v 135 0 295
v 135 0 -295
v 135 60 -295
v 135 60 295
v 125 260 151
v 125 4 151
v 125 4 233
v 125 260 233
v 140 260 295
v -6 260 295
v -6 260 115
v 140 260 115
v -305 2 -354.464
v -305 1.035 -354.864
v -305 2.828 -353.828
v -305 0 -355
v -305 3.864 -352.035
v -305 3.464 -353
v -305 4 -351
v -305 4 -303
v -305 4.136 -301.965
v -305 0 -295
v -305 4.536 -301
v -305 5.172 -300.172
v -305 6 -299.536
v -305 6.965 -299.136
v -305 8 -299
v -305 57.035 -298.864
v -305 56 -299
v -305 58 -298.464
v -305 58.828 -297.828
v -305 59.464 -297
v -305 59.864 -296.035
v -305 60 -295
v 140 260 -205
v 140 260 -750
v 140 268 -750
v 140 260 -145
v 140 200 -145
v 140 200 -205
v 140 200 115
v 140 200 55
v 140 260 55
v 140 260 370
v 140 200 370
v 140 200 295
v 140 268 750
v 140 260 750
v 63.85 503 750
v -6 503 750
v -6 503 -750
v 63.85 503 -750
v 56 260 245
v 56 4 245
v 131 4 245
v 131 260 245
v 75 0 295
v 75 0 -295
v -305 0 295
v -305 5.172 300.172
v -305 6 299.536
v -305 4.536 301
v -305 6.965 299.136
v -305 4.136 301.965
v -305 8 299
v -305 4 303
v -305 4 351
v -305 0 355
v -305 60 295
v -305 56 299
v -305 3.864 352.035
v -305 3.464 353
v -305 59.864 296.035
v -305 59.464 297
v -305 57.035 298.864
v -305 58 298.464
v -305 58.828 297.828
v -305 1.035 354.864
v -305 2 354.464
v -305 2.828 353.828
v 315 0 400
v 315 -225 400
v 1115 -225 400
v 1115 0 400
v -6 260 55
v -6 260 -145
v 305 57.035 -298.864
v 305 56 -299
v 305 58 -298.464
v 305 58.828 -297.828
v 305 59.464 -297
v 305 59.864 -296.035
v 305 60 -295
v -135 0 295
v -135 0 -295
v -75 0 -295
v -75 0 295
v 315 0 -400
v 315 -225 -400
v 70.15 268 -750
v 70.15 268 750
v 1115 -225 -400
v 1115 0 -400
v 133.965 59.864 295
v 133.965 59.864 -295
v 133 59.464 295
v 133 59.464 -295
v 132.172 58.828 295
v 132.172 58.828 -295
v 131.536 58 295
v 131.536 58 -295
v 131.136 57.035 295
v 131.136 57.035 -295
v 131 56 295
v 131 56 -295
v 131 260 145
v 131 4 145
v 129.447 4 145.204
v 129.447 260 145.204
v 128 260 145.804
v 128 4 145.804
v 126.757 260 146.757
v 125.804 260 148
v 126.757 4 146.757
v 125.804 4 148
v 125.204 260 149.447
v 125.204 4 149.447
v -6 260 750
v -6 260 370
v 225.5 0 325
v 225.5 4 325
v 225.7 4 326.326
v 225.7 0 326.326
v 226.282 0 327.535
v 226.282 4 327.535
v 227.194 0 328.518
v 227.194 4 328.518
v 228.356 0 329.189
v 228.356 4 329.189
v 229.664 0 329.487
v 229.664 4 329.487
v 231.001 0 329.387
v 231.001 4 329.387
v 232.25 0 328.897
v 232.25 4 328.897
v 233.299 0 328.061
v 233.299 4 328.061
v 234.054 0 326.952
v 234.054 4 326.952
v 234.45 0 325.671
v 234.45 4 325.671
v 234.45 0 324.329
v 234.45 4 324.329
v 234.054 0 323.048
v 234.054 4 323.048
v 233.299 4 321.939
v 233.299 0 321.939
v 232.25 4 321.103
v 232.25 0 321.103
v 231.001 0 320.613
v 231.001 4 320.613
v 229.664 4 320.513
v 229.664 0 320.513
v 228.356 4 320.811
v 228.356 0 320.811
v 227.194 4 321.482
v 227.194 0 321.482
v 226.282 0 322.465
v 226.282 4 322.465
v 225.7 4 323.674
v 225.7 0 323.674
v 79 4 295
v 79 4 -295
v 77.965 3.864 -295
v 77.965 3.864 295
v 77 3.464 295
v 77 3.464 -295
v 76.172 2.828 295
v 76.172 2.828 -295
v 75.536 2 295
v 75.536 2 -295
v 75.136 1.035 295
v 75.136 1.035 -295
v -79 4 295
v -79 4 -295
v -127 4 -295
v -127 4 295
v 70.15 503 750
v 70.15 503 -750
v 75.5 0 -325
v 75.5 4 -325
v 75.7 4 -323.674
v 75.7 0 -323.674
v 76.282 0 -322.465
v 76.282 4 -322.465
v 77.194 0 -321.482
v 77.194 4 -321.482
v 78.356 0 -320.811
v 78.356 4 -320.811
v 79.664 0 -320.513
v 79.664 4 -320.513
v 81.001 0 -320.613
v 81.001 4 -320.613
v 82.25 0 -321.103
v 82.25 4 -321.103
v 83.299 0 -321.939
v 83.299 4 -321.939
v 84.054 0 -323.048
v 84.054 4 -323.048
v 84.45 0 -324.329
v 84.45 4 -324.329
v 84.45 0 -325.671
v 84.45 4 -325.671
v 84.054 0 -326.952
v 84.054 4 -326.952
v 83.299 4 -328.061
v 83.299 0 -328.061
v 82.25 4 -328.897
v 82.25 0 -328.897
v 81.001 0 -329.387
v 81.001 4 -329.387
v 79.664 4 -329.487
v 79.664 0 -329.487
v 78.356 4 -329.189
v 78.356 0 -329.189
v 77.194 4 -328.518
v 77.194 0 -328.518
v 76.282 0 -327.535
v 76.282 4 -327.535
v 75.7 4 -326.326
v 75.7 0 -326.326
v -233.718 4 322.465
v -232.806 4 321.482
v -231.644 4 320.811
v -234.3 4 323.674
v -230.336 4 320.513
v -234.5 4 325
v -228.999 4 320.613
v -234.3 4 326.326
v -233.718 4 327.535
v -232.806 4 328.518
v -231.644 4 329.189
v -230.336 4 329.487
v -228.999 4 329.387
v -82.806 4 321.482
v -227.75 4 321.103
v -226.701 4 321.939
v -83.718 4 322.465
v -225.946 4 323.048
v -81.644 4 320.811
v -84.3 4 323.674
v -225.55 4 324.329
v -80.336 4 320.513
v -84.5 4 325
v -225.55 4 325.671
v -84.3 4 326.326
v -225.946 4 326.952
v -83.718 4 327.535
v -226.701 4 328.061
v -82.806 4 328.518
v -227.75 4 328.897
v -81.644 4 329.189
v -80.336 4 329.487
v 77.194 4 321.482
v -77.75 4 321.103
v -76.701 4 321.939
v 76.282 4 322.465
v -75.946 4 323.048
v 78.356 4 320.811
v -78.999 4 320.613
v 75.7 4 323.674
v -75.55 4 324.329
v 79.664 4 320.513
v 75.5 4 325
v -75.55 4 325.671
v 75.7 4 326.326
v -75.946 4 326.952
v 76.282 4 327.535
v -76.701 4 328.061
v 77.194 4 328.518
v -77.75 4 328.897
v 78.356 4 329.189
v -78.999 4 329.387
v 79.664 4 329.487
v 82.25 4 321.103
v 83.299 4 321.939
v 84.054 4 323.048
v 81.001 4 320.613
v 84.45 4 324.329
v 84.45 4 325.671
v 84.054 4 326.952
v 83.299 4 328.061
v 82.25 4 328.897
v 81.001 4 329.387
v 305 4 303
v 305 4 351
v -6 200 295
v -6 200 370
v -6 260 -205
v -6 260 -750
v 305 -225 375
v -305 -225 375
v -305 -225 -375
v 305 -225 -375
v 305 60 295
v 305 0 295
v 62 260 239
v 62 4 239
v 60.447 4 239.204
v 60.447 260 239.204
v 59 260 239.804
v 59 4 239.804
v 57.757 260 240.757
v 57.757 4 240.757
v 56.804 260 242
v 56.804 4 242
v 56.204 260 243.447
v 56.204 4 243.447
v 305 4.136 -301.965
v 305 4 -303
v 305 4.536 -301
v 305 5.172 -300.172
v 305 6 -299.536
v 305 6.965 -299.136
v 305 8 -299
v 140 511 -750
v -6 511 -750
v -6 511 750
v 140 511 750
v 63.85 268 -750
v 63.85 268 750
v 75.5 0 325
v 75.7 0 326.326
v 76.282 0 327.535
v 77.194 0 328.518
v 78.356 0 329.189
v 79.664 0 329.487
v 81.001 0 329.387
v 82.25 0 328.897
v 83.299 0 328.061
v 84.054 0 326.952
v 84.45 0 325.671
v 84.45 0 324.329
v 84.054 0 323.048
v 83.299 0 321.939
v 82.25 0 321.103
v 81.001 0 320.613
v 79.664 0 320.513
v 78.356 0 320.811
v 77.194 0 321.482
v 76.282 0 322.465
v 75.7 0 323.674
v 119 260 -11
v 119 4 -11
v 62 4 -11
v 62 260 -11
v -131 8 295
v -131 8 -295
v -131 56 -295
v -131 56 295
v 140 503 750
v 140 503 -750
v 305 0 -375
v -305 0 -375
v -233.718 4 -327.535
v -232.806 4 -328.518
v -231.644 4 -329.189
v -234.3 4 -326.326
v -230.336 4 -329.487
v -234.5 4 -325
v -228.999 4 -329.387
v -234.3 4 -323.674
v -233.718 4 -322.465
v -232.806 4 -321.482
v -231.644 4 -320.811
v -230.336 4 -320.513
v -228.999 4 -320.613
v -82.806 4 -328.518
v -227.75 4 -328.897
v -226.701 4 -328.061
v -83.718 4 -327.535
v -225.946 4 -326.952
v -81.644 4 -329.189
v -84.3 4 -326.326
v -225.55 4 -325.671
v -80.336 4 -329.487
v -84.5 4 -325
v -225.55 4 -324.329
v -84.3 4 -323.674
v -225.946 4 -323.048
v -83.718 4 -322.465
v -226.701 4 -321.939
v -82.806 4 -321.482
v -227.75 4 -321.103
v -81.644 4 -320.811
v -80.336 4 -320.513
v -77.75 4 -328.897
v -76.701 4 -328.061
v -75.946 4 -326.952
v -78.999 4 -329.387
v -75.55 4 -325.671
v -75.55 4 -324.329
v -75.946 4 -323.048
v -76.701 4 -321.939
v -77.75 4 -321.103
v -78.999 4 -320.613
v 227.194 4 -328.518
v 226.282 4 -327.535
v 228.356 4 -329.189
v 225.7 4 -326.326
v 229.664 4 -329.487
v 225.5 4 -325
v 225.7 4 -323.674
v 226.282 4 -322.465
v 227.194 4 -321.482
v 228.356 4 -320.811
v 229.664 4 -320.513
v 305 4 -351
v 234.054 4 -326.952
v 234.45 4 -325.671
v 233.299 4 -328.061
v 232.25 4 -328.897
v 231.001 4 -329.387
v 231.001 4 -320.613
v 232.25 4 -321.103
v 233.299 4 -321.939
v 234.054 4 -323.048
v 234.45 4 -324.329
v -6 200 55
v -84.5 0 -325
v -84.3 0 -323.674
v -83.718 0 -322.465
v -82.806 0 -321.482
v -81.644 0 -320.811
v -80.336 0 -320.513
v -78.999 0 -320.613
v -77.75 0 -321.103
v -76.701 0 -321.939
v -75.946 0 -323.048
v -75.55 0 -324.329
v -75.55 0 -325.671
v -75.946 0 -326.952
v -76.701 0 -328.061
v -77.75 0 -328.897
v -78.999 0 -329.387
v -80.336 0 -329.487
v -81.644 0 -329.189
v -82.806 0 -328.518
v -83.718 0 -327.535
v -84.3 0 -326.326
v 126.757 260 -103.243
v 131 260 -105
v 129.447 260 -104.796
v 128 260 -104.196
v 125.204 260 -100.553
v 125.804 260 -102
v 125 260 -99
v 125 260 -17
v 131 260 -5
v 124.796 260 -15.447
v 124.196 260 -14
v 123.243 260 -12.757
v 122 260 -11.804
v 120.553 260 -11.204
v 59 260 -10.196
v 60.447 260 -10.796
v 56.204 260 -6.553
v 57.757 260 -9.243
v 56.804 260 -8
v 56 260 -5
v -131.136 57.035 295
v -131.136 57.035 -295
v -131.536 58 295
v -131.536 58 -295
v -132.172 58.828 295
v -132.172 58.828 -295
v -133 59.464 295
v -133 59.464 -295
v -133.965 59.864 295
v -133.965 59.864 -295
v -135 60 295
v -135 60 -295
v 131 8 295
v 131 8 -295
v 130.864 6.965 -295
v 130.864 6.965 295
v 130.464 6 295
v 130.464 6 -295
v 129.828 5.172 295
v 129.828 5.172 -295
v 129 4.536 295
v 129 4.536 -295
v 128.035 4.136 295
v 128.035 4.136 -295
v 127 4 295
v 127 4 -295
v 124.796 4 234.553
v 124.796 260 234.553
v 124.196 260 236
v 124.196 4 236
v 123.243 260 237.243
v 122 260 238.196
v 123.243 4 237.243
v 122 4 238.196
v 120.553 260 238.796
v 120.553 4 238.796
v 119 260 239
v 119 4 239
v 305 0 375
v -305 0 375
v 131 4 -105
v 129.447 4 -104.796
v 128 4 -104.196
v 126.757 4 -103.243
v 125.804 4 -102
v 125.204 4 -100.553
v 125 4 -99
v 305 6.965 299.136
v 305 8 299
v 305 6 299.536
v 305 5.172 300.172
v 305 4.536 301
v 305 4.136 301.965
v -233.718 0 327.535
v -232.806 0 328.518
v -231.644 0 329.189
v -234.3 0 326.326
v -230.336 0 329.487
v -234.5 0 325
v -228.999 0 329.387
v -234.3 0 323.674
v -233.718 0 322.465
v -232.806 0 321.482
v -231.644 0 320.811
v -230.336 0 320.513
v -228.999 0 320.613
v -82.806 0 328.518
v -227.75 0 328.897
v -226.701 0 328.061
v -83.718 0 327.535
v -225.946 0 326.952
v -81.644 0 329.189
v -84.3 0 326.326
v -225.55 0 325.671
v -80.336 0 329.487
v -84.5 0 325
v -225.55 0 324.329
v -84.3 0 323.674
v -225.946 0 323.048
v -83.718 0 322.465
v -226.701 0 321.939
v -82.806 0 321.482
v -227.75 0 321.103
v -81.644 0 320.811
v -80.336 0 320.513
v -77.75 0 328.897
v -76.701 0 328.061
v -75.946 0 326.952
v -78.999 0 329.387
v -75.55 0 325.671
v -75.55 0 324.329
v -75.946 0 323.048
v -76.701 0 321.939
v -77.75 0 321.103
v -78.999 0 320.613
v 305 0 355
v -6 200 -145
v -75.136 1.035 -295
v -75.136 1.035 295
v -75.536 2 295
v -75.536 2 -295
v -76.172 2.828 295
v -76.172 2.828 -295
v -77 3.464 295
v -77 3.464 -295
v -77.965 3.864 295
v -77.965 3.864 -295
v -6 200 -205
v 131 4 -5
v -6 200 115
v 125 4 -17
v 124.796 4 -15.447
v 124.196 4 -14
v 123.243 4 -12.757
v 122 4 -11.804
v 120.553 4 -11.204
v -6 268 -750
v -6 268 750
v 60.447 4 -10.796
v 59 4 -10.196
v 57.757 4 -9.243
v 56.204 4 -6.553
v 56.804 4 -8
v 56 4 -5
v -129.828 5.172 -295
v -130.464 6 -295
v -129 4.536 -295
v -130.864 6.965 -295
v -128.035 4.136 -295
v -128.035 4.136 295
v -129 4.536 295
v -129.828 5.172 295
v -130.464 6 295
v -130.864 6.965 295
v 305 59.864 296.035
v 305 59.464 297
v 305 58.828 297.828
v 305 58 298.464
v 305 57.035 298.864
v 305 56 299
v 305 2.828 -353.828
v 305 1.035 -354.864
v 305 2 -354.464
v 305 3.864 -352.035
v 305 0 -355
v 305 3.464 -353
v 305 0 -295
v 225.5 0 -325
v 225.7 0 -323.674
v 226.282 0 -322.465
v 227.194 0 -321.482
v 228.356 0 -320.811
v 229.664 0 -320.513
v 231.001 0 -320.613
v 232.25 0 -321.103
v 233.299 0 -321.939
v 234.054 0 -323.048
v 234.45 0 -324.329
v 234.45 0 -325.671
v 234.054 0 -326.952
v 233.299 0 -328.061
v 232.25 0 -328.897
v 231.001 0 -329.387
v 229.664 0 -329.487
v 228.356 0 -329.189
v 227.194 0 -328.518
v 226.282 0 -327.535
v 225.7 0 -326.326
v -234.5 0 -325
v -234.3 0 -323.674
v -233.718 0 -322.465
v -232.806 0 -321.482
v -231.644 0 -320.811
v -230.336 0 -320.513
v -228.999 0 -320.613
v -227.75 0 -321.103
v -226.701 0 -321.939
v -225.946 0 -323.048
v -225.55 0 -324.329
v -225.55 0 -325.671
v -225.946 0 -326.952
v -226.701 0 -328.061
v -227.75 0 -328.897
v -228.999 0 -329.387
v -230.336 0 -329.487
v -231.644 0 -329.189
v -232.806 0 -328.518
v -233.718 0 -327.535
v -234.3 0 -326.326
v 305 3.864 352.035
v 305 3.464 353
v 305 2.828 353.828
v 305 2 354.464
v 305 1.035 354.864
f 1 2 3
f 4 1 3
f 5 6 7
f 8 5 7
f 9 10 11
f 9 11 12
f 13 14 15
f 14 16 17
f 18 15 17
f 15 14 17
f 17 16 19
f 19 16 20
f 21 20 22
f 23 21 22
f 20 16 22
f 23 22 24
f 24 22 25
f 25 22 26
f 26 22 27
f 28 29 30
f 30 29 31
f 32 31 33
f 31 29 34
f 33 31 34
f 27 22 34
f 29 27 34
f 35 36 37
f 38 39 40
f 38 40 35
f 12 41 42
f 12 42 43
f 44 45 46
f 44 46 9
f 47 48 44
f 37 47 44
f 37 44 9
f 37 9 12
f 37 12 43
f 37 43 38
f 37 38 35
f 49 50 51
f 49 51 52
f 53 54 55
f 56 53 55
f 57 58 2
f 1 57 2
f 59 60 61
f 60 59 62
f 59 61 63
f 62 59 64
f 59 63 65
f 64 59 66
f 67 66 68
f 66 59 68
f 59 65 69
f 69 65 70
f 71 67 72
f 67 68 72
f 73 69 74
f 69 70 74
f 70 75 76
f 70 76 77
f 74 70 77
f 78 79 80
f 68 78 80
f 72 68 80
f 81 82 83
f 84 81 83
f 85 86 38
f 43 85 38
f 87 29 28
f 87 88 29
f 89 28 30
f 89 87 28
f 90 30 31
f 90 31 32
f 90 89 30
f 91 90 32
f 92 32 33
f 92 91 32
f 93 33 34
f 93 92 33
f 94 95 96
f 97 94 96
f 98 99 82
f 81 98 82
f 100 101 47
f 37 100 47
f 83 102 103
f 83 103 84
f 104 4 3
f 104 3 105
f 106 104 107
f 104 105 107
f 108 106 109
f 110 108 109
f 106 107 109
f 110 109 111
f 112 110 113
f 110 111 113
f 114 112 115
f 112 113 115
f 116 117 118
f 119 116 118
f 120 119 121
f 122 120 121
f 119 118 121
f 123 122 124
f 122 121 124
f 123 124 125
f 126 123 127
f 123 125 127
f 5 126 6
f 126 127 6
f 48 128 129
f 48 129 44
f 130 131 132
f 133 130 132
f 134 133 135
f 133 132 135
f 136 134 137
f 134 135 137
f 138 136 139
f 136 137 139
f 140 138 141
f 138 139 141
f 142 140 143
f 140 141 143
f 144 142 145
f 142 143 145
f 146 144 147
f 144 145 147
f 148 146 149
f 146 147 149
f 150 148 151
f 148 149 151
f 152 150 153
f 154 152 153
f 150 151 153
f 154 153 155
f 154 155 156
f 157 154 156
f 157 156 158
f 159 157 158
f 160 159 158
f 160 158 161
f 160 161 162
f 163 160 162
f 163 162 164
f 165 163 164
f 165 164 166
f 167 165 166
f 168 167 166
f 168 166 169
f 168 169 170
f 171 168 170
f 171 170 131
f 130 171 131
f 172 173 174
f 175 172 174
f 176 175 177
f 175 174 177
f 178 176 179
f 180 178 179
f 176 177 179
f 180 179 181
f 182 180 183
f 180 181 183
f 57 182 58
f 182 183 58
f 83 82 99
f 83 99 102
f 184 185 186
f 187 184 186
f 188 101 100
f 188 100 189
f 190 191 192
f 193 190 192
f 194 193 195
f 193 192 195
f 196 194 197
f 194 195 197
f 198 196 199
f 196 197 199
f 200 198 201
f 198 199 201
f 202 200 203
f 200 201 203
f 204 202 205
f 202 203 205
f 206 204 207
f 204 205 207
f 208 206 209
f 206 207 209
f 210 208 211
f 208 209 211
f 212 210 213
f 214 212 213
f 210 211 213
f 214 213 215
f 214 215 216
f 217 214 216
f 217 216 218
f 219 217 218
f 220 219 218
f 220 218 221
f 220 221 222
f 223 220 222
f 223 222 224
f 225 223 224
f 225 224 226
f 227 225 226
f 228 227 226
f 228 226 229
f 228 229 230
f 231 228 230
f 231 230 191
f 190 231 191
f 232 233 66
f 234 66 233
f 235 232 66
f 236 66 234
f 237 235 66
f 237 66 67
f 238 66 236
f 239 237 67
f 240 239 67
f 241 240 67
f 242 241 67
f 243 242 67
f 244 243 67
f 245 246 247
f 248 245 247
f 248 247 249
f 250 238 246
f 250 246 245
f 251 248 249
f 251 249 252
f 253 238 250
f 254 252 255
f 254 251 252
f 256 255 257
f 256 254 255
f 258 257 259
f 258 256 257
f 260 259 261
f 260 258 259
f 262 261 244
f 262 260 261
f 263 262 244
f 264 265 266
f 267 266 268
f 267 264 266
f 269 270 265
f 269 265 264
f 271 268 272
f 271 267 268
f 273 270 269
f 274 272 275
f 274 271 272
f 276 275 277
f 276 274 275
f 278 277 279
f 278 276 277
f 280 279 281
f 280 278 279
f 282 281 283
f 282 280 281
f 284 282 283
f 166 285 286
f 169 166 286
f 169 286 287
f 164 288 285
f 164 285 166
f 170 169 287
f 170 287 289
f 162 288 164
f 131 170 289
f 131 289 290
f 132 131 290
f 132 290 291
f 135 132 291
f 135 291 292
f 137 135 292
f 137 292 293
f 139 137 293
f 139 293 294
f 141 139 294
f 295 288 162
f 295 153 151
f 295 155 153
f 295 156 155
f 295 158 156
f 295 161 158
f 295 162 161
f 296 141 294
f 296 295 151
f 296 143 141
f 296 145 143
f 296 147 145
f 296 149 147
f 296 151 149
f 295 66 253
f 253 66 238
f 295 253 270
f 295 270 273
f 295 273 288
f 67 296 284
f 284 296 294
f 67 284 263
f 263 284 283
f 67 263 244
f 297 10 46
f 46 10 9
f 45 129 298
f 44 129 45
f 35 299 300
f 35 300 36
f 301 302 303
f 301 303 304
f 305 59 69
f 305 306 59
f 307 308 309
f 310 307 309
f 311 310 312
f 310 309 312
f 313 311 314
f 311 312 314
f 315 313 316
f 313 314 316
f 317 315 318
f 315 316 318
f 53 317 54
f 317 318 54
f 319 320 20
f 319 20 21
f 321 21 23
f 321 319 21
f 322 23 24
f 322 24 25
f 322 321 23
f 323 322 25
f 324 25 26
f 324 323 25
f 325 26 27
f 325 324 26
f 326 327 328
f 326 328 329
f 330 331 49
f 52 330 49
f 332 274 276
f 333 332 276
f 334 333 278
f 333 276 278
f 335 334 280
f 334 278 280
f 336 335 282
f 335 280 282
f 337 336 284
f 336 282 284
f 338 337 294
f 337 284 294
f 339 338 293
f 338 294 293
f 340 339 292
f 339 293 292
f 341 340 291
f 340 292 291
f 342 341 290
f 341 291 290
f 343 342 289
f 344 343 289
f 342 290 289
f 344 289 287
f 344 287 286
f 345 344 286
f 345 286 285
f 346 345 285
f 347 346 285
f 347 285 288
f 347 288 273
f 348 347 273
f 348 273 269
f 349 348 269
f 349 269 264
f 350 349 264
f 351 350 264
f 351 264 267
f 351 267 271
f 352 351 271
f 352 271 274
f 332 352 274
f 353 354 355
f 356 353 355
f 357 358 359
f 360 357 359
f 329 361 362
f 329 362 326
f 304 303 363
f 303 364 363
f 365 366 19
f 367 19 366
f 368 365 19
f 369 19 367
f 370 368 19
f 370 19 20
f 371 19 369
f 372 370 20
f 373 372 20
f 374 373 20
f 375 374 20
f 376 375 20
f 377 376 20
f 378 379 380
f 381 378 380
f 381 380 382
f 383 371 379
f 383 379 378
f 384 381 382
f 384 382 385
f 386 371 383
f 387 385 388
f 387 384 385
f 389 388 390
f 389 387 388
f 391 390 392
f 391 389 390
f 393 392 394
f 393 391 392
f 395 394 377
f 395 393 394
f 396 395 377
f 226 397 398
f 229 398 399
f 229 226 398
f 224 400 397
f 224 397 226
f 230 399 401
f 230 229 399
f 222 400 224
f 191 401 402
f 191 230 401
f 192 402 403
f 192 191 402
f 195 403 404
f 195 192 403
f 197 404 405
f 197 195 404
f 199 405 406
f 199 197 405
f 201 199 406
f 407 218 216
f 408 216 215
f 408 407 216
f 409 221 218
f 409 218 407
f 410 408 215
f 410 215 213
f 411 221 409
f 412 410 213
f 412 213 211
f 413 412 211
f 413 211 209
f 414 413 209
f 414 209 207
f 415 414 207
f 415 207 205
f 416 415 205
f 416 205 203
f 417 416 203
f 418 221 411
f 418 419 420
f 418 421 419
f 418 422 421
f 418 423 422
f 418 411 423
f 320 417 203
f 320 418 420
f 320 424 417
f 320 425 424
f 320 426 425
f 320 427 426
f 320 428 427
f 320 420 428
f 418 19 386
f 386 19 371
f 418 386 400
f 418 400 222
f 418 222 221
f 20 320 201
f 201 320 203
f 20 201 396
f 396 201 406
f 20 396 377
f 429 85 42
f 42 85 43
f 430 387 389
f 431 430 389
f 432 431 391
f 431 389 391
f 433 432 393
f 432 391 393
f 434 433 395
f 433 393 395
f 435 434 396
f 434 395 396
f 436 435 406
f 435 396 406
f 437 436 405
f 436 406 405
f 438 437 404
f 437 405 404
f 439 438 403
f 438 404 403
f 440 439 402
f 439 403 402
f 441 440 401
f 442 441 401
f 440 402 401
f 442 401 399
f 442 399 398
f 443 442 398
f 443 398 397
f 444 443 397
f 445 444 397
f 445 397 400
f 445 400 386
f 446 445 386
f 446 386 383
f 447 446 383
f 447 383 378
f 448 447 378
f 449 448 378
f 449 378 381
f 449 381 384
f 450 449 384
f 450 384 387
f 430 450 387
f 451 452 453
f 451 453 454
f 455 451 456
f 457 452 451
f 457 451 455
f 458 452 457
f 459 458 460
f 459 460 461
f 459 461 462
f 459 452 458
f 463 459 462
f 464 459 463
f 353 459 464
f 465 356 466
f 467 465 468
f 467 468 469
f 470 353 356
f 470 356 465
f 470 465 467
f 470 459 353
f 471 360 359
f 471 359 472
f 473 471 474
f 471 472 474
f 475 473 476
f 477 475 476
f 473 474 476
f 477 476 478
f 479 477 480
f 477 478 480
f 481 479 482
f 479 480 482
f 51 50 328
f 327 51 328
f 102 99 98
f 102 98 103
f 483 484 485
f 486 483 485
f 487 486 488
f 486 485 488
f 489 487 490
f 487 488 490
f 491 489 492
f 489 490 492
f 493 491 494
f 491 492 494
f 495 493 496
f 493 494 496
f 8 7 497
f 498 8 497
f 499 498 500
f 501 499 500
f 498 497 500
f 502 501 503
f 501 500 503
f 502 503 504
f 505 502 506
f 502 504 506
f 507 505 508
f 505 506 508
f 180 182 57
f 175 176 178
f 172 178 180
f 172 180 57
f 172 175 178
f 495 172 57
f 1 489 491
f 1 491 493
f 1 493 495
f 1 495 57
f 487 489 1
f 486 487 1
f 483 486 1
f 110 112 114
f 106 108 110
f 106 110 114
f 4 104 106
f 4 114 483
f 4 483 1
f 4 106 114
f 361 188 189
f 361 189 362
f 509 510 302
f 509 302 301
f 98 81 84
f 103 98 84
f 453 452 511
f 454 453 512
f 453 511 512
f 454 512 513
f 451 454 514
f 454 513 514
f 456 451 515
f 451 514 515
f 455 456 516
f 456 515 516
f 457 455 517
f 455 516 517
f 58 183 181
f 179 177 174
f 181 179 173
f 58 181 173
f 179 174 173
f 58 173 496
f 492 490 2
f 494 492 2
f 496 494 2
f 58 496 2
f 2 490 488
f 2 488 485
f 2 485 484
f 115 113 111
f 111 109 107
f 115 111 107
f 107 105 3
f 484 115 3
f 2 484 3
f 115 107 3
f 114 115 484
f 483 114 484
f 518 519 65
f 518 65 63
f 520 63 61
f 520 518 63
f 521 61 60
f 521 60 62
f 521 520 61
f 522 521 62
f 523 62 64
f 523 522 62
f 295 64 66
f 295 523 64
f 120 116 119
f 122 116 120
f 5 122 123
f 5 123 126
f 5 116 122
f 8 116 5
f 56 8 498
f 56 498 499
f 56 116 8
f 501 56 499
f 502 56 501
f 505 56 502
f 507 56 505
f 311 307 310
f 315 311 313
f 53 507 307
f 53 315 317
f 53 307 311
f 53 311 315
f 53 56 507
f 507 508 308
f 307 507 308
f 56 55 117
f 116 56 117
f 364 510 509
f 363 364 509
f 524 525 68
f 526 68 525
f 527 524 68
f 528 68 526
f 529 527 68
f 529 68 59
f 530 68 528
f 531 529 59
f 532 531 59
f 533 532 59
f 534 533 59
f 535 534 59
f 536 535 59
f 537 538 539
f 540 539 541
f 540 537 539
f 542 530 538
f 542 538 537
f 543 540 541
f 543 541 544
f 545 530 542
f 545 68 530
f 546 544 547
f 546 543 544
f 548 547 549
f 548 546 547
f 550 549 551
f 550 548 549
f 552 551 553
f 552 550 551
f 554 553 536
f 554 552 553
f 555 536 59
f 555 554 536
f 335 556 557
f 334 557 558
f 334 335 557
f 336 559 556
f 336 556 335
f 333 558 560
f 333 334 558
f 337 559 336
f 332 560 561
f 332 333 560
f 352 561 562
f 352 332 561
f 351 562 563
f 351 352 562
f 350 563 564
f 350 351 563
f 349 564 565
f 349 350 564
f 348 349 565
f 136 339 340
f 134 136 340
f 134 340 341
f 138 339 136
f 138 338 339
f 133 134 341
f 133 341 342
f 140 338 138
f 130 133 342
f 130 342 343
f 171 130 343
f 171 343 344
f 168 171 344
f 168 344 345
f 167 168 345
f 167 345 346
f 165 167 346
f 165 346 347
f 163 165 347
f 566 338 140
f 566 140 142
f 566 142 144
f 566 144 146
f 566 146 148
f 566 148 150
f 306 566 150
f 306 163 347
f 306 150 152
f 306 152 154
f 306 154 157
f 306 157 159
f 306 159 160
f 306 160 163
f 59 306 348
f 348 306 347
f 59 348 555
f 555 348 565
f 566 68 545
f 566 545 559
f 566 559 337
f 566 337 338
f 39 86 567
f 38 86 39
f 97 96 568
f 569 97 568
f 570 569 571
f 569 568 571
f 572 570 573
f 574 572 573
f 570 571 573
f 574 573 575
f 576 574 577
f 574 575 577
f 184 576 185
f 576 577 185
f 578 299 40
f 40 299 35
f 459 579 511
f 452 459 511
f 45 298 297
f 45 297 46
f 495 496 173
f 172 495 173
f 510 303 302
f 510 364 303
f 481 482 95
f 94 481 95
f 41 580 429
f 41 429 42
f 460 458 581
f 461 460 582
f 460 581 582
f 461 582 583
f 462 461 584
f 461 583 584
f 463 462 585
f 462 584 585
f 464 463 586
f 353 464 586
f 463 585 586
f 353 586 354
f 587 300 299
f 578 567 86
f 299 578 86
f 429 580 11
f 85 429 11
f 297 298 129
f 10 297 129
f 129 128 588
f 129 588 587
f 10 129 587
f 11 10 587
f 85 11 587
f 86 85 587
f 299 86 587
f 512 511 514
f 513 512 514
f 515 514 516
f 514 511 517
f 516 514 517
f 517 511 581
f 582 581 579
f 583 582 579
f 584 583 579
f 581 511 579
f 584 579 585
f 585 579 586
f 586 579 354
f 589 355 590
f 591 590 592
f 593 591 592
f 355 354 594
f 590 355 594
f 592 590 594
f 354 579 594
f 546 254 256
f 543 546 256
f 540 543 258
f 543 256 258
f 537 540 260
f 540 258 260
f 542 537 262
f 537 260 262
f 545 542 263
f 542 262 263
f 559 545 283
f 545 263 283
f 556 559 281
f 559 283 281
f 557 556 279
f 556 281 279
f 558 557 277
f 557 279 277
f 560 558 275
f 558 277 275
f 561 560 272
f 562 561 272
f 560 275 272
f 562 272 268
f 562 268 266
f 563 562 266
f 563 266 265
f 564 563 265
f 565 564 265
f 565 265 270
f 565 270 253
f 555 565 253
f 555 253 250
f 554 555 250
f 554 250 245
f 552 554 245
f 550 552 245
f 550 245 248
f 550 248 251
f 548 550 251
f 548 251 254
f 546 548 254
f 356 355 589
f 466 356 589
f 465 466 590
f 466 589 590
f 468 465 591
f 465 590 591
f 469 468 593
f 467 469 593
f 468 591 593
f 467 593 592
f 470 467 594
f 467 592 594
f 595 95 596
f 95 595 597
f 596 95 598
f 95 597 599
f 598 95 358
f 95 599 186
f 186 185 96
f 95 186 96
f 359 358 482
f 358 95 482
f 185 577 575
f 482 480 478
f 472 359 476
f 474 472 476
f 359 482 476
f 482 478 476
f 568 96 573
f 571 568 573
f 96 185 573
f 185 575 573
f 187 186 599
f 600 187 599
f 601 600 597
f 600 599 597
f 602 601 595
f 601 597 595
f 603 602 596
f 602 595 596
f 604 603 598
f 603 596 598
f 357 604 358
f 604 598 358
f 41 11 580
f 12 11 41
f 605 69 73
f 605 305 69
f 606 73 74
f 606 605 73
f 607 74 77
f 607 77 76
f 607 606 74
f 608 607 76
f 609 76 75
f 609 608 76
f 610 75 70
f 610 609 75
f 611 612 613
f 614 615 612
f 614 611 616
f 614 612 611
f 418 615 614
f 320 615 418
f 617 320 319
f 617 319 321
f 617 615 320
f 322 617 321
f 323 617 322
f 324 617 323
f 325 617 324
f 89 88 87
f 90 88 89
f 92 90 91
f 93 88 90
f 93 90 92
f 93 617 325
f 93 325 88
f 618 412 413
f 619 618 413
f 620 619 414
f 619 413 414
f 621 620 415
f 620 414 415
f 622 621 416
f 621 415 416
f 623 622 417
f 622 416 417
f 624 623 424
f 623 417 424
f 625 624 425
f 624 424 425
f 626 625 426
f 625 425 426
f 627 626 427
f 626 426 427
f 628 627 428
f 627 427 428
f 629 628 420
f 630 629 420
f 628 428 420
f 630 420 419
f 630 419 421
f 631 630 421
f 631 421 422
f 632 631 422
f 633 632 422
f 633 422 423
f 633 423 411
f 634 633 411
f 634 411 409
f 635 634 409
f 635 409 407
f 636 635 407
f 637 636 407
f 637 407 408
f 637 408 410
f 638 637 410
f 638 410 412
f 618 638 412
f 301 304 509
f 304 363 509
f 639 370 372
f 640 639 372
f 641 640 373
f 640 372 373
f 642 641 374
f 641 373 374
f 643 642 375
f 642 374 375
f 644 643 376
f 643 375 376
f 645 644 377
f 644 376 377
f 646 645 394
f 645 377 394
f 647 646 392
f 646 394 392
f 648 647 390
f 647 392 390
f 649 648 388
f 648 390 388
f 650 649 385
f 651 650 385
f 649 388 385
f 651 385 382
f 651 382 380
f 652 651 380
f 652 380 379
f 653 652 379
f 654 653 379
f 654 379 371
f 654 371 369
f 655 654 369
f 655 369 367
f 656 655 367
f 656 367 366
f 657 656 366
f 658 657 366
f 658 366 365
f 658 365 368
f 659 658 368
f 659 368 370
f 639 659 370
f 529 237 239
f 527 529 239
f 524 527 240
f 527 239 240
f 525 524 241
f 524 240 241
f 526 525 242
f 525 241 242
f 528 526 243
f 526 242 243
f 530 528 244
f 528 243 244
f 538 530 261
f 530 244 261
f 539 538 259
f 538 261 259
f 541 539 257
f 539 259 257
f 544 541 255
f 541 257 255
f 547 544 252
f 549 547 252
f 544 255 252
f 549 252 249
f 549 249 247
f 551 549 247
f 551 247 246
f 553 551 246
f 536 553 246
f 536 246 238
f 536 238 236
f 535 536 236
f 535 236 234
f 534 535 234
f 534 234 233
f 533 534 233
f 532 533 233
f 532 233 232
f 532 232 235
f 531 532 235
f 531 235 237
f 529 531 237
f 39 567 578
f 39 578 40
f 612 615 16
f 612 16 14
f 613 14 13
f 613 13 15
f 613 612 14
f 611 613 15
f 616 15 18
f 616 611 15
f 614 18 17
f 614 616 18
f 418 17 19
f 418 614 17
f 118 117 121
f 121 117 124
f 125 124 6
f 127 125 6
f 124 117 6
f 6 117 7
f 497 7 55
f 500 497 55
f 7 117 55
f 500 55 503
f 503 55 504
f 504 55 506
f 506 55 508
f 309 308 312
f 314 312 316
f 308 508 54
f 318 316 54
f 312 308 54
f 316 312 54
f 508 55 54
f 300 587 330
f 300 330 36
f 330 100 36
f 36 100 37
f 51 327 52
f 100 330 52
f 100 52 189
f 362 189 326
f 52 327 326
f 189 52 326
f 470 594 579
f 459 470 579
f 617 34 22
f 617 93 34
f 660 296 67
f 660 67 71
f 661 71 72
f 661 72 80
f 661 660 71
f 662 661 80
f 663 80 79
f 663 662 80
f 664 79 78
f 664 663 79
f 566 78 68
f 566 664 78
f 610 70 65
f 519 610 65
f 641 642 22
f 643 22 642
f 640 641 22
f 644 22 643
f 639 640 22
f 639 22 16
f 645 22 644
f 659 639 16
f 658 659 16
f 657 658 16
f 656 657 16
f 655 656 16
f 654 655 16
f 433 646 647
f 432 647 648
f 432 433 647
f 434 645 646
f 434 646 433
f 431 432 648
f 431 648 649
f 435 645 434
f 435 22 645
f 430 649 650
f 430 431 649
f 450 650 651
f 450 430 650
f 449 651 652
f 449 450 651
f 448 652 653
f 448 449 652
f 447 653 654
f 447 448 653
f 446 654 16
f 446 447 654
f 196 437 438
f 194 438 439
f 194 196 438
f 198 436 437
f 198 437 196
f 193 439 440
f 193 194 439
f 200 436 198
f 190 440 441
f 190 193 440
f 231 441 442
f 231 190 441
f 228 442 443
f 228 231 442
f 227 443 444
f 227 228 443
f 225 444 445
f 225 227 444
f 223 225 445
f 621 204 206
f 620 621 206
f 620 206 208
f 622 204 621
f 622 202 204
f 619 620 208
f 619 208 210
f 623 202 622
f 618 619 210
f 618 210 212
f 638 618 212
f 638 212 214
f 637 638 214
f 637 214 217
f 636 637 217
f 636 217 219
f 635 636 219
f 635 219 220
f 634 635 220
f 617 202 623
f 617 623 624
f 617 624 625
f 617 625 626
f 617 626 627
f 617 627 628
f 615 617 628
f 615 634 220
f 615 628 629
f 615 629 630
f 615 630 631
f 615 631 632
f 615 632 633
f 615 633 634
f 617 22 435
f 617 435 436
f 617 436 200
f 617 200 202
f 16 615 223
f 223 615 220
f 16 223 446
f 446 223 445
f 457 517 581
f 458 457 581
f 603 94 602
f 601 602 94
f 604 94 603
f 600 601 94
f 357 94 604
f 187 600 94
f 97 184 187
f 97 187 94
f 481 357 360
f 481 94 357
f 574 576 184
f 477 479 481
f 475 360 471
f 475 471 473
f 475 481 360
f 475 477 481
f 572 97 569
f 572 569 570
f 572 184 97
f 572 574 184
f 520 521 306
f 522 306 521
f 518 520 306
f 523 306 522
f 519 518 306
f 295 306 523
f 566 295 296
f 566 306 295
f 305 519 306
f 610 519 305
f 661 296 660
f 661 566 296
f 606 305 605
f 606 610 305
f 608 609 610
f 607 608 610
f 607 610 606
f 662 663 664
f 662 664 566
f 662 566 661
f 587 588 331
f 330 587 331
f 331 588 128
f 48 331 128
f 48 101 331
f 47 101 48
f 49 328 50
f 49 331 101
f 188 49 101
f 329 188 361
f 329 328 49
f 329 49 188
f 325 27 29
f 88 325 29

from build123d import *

# Parameters (mm, degrees)
F1_DEPTH  = 305
F3_DEPTH  = 590
F5_D      = 9
F5_2_D    = 9
F6_W      = 610
F6_H      = 750
F7_DEPTH  = 200
F8_DEPTH  = 25
F9_W      = 800
F9_H      = 800
F10_DEPTH = 225
F11_W     = 146
F11_H     = 251
F12_DEPTH = 750
F13_W     = 139.7
F13_H     = 235
F14_DEPTH = 1500.001
F15_W     = 146
F15_H     = 75
F15_H_2   = 60
F16_DEPTH = 60
F18_DEPTH = 256


with BuildPart() as f1:
    # F0 (on Right) → F1 (new body, symmetric)
    with BuildSketch(Plane.YZ):
        with BuildLine():
            Line((60, -295), (0, -295))
            Line((0, -295), (0, -355))
            ThreePointArc((0, -355), (2.8284271247, -353.8284271247), (4, -351))
            Line((4, -351), (4, -303))
            ThreePointArc((4, -303), (5.1715728753, -300.1715728753), (8, -299))
            Line((8, -299), (56, -299))
            ThreePointArc((56, -299), (58.8284271247, -297.8284271247), (60, -295))
        make_face()
    extrude(amount=F1_DEPTH, both=True)

    # F5 (through all)
    with Locations(Plane.XZ):
        with Locations((-230, 325), (-80, 325), (80, 325), (230, 325), (-80, -325), (80, -325), (-230, -325), (230, -325)):
            Hole(F5_D / 2)


with BuildPart() as f1b:
    # F0 (on Right) → F1, piece 2 (new body, symmetric)
    with BuildSketch(Plane.YZ):
        with BuildLine():
            ThreePointArc((60, 295), (58.8284271247, 297.8284271247), (56, 299))
            Line((56, 299), (8, 299))
            ThreePointArc((8, 299), (5.1715728753, 300.1715728753), (4, 303))
            Line((4, 303), (4, 351))
            ThreePointArc((4, 351), (2.8284271247, 353.8284271247), (0, 355))
            Line((0, 355), (0, 295))
            Line((0, 295), (60, 295))
        make_face()
    extrude(amount=F1_DEPTH, both=True)

    # F5#2 (through all)
    with Locations(Plane.XZ):
        with Locations((-230, 325), (-80, 325), (80, 325), (230, 325), (-80, -325), (80, -325), (-230, -325), (230, -325)):
            Hole(F5_2_D / 2)


with BuildPart() as f3:
    # F2 (on face) → F3 (new body, through all)
    with BuildSketch(Plane.XY.offset(-295)):
        with BuildLine():
            ThreePointArc((135, 60), (132.1715728753, 58.8284271247), (131, 56))
            Line((131, 56), (131, 8))
            ThreePointArc((131, 8), (129.8284271247, 5.1715728753), (127, 4))
            Line((127, 4), (79, 4))
            ThreePointArc((79, 4), (76.1715728753, 2.8284271247), (75, 0))
            Line((75, 0), (135, 0))
            Line((135, 0), (135, 60))
        make_face()
    extrude(amount=F3_DEPTH)


with BuildPart() as f3b:
    # F2 (on face) → F3, piece 2 (new body, through all)
    with BuildSketch(Plane.XY.offset(-295)):
        with BuildLine():
            Line((-135, 0), (-75, 0))
            ThreePointArc((-75, 0), (-76.1715728753, 2.8284271247), (-79, 4))
            Line((-79, 4), (-127, 4))
            ThreePointArc((-127, 4), (-129.8284271247, 5.1715728753), (-131, 8))
            Line((-131, 8), (-131, 56))
            ThreePointArc((-131, 56), (-132.1715728753, 58.8284271247), (-135, 60))
            Line((-135, 60), (-135, 0))
        make_face()
    extrude(amount=F3_DEPTH)


with BuildPart() as f7:
    # F6 (on face) → F7 (new body)
    with BuildSketch(Plane.XZ):
        Rectangle(F6_W, F6_H)
    extrude(amount=F7_DEPTH)

    # F8 (add): a face of the model
    f8_faces = [f7.faces().sort_by_distance(p)[0] for p in [
        (0, -200, 0),
    ]]
    extrude(f8_faces, amount=F8_DEPTH)


with BuildPart() as f10:
    # F9 (on face) → F10 (new body, through all)
    with BuildSketch(Plane.XZ.offset(225)):
        with Locations((715, 0)):
            Rectangle(F9_W, F9_H)
    extrude(amount=-F10_DEPTH)


with BuildPart() as f12:
    # F11 (on Top) → F12 (new body, symmetric)
    with BuildSketch(Plane.XY):
        with Locations((67, 385.5)):
            Rectangle(F11_W, F11_H)
    extrude(amount=F12_DEPTH, both=True)

    # F13 (on face) → F14 (cut, through all)
    with BuildSketch(Plane.XY.offset(750)):
        with Locations((140, 385.5)):
            Rectangle(F13_W, F13_H)
        with Locations((-6, 385.5)):
            Rectangle(F13_W, F13_H)
    extrude(amount=-F14_DEPTH, mode=Mode.SUBTRACT)

    # F15 (on face) → F16 (join)
    with BuildSketch(Plane.XZ.offset(-260)):
        with Locations((67, 332.5)):
            Rectangle(F15_W, F15_H)
        with Locations((67, 85)):
            Rectangle(F15_W, F15_H_2)
        with Locations((67, -175)):
            Rectangle(F15_W, F15_H_2)
    extrude(amount=F16_DEPTH)


with BuildPart() as f18:
    # F17 (on face) → F18 (new body, through all)
    with BuildSketch(Plane(origin=(0, 4, 0), x_dir=(-1, 0, 0), z_dir=(0, 1, 0))):
        with BuildLine():
            Line((-131, 245), (-131, 145))
            ThreePointArc((-131, 145), (-126.7573593129, 146.7573593129), (-125, 151))
            Line((-125, 151), (-125, 233))
            ThreePointArc((-125, 233), (-123.2426406871, 237.2426406871), (-119, 239))
            Line((-119, 239), (-62, 239))
            ThreePointArc((-62, 239), (-57.7573593129, 240.7573593129), (-56, 245))
            Line((-56, 245), (-131, 245))
        make_face()
    extrude(amount=F18_DEPTH)


with BuildPart() as f18b:
    # F17 (on face) → F18, piece 2 (new body, through all)
    with BuildSketch(Plane(origin=(0, 4, 0), x_dir=(-1, 0, 0), z_dir=(0, 1, 0))):
        with BuildLine():
            Line((-125, -99), (-125, -17))
            ThreePointArc((-125, -17), (-123.2426406871, -12.7573593129), (-119, -11))
            Line((-119, -11), (-62, -11))
            ThreePointArc((-62, -11), (-57.7573593129, -9.2426406871), (-56, -5))
            Line((-56, -5), (-131, -5))
            Line((-131, -5), (-131, -105))
            ThreePointArc((-131, -105), (-126.7573593129, -103.2426406871), (-125, -99))
        make_face()
    extrude(amount=F18_DEPTH)


solid = Compound([f1.part, f1b.part, f3.part, f3b.part, f7.part, f10.part, f12.part, f18.part, f18b.part])
